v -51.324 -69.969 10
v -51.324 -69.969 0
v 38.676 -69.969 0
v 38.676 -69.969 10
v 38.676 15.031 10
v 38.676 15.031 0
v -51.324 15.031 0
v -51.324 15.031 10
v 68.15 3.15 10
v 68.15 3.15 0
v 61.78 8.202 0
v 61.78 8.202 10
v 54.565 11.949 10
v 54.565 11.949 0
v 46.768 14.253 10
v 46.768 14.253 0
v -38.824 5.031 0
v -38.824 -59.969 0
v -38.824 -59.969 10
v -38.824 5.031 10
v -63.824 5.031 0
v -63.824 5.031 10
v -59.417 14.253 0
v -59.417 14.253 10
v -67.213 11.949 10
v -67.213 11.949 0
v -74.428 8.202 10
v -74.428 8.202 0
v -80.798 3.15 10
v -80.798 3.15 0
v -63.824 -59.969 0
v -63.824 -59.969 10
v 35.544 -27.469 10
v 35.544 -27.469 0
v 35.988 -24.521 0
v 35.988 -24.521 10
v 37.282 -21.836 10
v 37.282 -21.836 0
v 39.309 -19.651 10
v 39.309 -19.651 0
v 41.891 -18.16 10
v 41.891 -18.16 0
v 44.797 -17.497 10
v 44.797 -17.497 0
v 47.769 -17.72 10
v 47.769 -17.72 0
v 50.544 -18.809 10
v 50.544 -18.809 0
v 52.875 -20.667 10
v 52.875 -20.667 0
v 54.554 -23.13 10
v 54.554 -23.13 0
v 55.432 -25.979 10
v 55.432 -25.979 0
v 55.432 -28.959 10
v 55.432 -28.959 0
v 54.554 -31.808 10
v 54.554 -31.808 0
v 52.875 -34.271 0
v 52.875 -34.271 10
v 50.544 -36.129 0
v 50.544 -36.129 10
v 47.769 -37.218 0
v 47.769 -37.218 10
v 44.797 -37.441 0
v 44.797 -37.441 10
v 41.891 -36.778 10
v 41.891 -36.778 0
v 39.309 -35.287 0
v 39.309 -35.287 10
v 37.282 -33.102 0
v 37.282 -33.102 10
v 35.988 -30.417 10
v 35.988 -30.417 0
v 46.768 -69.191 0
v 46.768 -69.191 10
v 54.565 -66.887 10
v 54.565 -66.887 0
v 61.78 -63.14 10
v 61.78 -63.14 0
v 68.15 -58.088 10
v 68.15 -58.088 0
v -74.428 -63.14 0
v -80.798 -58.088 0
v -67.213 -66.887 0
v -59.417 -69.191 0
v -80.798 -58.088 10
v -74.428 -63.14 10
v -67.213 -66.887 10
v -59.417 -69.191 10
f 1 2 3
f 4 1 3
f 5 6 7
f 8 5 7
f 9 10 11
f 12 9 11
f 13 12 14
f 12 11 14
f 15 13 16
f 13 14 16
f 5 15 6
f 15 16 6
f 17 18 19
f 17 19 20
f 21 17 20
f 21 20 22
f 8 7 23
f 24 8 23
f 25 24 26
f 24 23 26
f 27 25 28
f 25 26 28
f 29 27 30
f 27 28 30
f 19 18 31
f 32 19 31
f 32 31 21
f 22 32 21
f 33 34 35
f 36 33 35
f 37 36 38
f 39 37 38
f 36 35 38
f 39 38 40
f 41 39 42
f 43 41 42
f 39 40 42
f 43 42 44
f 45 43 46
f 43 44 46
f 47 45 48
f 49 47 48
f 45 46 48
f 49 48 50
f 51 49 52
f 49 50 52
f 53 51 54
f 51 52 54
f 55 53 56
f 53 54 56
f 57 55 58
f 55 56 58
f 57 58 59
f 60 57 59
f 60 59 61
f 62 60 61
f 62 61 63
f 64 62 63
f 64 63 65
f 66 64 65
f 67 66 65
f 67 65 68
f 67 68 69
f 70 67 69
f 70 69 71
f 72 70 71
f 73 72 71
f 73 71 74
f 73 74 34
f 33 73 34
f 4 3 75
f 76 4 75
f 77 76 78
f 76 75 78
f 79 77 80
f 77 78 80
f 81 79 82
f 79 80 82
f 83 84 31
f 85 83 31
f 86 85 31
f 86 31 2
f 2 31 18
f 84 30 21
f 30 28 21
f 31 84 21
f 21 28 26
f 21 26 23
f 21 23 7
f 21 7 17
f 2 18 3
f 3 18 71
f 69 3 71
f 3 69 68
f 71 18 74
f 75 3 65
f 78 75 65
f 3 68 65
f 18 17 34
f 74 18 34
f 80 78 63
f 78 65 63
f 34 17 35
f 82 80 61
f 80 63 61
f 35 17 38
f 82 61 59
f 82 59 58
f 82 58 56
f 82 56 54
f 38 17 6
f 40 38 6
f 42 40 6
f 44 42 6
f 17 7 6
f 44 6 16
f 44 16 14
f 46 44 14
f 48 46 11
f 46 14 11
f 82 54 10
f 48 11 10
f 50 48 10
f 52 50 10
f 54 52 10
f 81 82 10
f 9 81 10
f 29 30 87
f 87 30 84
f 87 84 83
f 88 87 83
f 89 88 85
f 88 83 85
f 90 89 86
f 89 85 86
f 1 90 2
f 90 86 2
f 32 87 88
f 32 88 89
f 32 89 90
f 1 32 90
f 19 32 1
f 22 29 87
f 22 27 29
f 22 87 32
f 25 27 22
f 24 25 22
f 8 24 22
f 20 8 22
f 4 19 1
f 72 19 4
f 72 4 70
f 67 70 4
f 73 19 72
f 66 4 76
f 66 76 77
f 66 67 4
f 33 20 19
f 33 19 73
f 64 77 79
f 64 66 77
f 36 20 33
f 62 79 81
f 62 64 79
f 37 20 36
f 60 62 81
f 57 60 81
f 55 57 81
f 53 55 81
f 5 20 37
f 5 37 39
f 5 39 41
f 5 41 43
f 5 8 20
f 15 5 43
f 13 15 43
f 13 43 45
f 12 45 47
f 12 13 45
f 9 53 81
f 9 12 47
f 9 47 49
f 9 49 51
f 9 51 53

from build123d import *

# Parameters (mm, degrees)
BOSS_EXTRUDE1_DEPTH = 10
SKETCH2_W           = 25
SKETCH2_H           = 65
CUT_EXTRUDE2_DEPTH  = 20
SKETCH3_R           = 10
CUT_EXTRUDE3_DEPTH  = 20


with BuildPart() as part:
    # Sketch1 → Boss-Extrude1 (new body)
    with BuildSketch(Plane.XY):
        with BuildLine():
            Line((-80.798103543, 3.150277686), (-80.798103543, -58.088380877))
            ThreePointArc((-80.798103543, -58.088380877), (-67.213396938, -66.887140682), (-51.324273213, -69.969051596))
            Line((-51.324273213, -69.969051596), (38.675726787, -69.969051596))
            ThreePointArc((38.675726787, -69.969051596), (54.564850513, -66.887140682), (68.149557118, -58.088380877))
            Line((68.149557118, -58.088380877), (68.149557118, 3.150277686))
            ThreePointArc((68.149557118, 3.150277686), (54.564850513, 11.949037491), (38.675726787, 15.030948404))
            Line((38.675726787, 15.030948404), (-51.324273213, 15.030948404))
            ThreePointArc((-51.324273213, 15.030948404), (-67.213396938, 11.949037491), (-80.798103543, 3.150277686))
        make_face()
    extrude(amount=BOSS_EXTRUDE1_DEPTH)

    # Sketch2 → Cut-Extrude2 (cut)
    with BuildSketch(Plane(origin=(0, 0, 0), x_dir=(-1, 0, 0), z_dir=(0, 0, -1))):
        with Locations((51.324273213, -27.469051596)):
            Rectangle(SKETCH2_W, SKETCH2_H)
    extrude(amount=-CUT_EXTRUDE2_DEPTH, mode=Mode.SUBTRACT)

    # Sketch3 → Cut-Extrude3 (cut)
    with BuildSketch(Plane(origin=(0, 0, 0), x_dir=(-1, 0, 0), z_dir=(0, 0, -1))):
        with Locations((-45.543981451, -27.469051596)):
            Circle(SKETCH3_R)
    extrude(amount=-CUT_EXTRUDE3_DEPTH, mode=Mode.SUBTRACT)


solid = part.part
